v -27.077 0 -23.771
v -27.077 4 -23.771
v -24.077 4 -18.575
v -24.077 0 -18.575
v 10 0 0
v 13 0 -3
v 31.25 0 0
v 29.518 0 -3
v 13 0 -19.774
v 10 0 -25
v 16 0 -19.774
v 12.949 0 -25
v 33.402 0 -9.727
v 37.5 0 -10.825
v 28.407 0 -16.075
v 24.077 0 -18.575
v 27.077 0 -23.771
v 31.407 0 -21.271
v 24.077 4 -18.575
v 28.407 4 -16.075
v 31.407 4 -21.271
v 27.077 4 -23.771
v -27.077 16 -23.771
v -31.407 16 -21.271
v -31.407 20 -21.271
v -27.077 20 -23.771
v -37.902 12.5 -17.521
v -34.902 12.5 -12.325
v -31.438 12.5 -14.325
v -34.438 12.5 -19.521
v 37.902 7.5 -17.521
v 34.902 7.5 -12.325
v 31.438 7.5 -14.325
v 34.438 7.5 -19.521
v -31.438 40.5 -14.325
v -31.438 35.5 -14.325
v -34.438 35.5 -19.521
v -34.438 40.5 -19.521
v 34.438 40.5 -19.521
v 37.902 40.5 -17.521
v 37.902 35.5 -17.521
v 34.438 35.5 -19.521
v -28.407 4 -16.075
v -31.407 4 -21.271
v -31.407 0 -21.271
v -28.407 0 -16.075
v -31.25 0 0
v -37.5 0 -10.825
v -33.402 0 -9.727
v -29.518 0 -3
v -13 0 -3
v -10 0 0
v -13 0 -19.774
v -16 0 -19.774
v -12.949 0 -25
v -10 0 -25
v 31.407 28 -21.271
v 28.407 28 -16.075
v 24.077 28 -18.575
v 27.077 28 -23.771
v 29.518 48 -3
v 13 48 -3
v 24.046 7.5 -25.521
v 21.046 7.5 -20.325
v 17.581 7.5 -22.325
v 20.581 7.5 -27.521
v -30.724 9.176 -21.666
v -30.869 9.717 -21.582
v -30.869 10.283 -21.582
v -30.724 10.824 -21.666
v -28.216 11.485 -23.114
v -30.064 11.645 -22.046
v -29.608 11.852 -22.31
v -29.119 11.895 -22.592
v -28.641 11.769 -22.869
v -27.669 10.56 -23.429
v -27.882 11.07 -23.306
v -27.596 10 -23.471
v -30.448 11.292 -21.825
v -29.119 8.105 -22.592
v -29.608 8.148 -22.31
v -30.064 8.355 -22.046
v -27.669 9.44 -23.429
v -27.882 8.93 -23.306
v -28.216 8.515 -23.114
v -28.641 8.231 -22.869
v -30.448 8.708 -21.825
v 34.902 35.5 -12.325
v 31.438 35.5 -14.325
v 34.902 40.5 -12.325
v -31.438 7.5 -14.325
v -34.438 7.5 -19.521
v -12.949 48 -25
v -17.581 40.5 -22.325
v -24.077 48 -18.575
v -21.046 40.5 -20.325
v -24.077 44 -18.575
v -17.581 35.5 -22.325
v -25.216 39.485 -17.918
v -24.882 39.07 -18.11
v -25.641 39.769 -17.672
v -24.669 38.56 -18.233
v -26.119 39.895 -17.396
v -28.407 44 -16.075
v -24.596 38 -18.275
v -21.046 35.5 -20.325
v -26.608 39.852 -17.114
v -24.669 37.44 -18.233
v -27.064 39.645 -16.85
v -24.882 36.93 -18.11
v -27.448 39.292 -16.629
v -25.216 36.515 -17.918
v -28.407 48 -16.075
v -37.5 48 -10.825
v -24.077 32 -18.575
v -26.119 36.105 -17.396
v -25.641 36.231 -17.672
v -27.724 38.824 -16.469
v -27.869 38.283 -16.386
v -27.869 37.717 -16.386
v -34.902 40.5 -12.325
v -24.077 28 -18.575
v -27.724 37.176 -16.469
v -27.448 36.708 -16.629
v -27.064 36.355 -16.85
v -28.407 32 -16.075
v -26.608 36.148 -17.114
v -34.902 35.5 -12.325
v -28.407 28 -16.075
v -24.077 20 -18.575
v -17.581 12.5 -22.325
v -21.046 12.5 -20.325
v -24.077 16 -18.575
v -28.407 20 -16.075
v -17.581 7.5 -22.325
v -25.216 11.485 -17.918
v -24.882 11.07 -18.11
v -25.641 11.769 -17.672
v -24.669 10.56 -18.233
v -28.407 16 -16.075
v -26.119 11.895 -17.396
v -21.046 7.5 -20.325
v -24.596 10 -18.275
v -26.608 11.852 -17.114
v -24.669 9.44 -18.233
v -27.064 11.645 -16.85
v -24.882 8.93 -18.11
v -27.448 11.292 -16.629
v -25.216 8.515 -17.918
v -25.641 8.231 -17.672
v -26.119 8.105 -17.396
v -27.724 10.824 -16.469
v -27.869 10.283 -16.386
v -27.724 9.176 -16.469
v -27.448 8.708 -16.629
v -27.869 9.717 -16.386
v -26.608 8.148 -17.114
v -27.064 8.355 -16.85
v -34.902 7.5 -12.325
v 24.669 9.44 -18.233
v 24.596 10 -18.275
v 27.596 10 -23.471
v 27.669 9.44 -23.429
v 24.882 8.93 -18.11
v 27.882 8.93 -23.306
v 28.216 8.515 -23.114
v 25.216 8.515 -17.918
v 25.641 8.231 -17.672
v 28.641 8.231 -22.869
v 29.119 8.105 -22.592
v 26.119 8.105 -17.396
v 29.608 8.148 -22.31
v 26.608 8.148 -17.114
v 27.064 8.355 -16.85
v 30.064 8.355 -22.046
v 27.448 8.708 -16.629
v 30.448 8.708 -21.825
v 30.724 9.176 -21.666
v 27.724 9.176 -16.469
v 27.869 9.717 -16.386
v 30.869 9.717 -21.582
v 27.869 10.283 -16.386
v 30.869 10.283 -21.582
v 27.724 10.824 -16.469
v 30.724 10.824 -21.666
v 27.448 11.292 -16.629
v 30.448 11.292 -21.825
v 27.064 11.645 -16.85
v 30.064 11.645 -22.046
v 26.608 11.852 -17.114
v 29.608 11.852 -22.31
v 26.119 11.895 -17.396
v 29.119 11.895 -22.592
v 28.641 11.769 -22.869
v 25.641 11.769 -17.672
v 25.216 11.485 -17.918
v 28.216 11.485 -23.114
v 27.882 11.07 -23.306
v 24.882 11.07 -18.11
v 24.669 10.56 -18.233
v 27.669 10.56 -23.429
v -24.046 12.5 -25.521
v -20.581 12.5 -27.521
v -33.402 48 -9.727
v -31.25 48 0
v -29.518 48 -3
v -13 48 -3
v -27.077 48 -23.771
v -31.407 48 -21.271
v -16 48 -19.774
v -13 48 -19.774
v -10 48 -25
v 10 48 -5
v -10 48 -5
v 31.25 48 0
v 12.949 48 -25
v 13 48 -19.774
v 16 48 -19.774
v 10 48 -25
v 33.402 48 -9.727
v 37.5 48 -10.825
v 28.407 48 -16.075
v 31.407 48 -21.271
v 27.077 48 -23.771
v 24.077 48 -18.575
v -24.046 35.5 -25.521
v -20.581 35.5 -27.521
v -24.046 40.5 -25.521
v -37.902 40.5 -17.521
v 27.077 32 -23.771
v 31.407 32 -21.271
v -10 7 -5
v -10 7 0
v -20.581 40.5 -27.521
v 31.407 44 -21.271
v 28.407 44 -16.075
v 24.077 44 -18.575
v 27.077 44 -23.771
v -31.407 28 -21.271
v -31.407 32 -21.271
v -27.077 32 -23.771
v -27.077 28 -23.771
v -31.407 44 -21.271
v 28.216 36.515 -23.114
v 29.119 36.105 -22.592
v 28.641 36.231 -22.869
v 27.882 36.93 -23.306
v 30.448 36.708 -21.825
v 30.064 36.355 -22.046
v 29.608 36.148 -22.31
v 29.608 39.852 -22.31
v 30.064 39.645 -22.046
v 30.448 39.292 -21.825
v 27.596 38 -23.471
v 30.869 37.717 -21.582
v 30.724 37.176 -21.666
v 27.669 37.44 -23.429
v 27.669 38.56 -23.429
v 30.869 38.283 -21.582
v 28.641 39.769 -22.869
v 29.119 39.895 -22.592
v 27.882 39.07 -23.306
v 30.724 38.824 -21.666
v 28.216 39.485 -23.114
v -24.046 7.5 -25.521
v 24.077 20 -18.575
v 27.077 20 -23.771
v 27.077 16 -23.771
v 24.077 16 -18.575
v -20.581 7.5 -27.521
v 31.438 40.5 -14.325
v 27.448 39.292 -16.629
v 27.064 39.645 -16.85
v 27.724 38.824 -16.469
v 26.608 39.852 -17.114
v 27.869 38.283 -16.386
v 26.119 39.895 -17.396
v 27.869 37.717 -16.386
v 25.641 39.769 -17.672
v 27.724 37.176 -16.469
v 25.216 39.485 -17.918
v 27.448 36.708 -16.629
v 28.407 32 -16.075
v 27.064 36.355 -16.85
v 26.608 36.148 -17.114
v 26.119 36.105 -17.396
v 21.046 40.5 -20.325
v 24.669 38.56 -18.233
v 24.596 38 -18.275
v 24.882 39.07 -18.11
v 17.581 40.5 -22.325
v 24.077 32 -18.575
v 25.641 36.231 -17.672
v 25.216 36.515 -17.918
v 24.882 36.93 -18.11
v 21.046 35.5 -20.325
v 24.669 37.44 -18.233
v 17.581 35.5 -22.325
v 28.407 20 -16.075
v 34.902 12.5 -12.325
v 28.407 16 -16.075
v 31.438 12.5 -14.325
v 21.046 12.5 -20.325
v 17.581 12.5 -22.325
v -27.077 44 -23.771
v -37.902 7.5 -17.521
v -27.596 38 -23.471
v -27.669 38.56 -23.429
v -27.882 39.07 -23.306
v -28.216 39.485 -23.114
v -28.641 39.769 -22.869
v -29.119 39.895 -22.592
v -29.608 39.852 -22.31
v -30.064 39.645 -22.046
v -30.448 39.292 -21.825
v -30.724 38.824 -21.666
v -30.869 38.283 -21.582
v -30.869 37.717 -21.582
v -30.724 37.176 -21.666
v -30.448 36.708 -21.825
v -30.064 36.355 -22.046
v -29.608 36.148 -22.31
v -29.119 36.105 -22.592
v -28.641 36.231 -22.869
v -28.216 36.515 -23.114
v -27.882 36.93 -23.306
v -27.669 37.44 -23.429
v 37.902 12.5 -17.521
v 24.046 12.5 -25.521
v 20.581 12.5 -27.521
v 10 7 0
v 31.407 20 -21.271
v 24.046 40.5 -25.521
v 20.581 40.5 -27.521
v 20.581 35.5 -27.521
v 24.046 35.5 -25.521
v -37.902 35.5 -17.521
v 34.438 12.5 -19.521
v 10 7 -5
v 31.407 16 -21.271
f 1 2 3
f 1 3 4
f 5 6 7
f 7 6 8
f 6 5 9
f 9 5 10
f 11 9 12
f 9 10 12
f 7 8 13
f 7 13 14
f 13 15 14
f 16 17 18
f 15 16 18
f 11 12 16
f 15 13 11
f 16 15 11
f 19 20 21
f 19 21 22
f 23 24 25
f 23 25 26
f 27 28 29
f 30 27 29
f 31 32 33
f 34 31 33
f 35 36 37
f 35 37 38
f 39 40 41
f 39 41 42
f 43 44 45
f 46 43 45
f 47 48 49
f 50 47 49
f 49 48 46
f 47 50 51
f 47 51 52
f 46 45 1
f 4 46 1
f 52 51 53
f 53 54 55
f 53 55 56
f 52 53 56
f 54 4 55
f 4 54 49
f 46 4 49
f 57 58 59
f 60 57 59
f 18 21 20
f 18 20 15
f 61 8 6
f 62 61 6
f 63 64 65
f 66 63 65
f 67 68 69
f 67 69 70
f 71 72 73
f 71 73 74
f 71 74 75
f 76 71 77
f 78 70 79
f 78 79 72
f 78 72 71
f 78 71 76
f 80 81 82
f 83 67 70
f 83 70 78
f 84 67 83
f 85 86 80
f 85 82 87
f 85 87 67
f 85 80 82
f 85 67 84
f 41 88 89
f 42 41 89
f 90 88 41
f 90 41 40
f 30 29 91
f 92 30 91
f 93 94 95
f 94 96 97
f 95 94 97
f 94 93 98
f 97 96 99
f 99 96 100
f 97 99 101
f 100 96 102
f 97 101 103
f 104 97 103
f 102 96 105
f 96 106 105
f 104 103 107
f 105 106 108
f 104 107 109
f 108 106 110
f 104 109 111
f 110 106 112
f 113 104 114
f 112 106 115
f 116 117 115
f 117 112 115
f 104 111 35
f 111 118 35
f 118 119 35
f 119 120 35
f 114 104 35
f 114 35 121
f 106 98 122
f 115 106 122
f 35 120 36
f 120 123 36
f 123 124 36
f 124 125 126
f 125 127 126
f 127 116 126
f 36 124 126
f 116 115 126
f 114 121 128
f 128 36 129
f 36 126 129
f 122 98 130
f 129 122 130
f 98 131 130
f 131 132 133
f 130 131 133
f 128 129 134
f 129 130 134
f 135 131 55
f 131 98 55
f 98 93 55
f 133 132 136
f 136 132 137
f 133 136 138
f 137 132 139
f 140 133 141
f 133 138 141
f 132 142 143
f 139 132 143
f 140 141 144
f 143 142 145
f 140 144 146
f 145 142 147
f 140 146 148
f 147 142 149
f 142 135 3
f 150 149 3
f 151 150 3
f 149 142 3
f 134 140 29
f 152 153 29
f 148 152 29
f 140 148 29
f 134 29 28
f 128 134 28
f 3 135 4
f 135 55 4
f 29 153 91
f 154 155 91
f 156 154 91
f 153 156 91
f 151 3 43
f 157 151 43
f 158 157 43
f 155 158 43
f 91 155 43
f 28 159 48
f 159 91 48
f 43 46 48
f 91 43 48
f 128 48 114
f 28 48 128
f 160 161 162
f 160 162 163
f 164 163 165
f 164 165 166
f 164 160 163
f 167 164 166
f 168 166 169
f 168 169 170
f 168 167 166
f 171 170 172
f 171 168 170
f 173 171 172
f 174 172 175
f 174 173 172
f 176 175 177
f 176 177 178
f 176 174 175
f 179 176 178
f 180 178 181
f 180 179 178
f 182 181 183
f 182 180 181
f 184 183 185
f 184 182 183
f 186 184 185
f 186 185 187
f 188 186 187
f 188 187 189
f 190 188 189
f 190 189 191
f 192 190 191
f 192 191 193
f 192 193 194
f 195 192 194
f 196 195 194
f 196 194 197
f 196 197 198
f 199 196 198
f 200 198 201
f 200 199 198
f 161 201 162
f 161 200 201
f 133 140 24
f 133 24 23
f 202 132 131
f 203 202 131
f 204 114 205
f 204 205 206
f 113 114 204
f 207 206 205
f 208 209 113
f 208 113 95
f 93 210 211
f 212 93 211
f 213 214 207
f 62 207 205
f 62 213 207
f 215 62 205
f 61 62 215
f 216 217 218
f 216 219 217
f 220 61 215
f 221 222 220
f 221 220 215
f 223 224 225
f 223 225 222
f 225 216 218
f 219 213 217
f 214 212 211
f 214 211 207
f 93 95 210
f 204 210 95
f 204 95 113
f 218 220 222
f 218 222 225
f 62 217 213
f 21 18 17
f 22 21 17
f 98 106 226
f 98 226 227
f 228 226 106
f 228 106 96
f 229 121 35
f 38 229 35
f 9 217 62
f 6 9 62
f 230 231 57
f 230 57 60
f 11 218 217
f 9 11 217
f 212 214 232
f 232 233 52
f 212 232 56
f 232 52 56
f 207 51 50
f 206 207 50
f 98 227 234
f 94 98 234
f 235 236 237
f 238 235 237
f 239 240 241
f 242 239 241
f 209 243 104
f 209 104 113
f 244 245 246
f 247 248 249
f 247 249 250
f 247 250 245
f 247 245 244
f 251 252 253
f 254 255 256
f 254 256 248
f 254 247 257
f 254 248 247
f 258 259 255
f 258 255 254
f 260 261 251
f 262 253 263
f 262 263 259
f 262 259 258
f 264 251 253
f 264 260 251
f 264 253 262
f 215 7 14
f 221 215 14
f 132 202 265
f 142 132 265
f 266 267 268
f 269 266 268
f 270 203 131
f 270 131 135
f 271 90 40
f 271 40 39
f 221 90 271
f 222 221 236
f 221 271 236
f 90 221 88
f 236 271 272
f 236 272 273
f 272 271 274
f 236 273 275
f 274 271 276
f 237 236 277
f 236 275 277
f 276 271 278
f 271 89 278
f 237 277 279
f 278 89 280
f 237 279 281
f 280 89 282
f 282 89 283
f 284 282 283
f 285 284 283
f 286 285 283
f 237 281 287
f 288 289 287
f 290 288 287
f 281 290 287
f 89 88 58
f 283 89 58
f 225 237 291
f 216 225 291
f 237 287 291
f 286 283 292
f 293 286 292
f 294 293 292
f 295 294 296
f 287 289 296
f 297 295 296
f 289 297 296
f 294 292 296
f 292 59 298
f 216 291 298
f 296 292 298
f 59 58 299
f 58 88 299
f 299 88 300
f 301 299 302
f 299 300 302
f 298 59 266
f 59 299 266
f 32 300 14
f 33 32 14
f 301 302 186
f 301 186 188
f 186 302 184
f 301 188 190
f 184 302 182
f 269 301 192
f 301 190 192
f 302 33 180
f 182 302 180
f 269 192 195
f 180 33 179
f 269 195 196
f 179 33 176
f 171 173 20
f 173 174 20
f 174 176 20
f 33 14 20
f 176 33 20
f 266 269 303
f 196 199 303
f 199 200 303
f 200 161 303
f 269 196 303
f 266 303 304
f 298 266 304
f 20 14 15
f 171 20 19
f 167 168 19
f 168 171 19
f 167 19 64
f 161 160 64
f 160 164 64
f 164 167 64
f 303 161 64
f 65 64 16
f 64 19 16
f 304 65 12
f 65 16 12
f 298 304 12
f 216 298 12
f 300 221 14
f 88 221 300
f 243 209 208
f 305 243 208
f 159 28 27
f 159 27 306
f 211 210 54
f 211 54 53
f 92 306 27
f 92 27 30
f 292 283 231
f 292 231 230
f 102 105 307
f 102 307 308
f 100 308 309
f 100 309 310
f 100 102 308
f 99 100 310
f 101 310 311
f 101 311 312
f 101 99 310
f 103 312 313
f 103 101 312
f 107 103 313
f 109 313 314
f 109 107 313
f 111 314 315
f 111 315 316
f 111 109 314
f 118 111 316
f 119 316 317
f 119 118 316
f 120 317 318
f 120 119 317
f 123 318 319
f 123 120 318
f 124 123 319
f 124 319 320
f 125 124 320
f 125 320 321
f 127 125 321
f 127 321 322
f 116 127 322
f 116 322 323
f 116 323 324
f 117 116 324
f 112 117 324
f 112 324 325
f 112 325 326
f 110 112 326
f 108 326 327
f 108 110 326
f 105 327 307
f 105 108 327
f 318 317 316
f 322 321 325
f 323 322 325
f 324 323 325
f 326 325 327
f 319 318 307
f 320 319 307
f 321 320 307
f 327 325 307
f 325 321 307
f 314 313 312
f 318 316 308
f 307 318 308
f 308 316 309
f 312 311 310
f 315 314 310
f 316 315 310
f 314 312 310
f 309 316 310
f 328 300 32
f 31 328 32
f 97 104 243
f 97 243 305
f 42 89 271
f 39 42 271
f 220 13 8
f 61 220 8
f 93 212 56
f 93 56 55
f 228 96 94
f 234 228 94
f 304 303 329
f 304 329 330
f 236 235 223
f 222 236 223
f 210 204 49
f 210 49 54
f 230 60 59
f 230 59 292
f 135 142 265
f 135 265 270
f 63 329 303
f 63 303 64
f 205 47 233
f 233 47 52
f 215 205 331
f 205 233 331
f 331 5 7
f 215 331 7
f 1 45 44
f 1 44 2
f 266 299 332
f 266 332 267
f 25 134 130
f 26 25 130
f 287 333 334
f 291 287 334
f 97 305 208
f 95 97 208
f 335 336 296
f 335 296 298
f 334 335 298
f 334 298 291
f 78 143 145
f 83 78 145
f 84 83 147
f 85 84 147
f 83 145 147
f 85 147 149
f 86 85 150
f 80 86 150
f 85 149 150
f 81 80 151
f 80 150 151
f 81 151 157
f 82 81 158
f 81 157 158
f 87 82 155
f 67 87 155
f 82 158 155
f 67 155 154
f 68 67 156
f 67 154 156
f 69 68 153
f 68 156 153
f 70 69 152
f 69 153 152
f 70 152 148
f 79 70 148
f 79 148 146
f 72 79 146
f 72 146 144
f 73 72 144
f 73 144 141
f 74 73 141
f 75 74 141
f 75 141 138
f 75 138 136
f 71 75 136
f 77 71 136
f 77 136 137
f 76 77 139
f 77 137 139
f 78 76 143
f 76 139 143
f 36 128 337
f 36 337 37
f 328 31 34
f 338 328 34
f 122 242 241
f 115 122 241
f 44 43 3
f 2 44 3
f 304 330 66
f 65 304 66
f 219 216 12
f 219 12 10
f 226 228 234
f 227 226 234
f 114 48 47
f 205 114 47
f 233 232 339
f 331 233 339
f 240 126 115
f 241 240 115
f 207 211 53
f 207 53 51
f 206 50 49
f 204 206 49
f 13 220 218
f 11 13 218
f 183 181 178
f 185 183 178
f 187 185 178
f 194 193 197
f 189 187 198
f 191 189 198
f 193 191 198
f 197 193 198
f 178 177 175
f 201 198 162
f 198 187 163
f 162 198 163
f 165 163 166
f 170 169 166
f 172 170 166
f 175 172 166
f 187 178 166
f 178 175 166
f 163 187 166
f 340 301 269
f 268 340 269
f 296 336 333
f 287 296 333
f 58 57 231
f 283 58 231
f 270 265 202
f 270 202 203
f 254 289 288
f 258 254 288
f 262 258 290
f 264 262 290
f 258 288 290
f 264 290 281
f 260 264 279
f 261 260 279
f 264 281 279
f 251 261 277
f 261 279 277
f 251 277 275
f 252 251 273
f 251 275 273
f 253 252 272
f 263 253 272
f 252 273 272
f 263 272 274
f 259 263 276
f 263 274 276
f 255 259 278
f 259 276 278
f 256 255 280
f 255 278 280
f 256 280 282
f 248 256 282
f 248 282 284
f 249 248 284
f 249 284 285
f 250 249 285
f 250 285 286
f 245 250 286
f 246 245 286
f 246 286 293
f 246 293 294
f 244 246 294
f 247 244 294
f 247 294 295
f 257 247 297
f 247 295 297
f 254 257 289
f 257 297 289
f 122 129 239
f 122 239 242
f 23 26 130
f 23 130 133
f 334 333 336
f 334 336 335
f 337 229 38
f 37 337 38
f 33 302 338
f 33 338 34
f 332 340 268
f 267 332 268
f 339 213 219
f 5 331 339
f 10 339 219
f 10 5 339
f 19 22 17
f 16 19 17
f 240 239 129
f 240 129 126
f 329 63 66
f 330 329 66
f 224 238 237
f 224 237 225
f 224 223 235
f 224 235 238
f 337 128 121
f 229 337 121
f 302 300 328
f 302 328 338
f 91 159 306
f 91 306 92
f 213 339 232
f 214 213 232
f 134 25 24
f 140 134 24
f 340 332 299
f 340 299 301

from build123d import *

# Parameters (mm, degrees)
BOSS_EXTRU_1_DEPTH          = 48
ENL_V_MAT_EXTRU_1_REACH     = 67.843
BOSS_EXTRU_2_DEPTH          = 48
ESQUISSE3_R                 = 1.9
ESQUISSE3_W                 = 5
ESQUISSE3_H                 = 4
ESQUISSE3_W_2               = 4
ESQUISSE3_H_2               = 5
BOSS_EXTRU_3_DEPTH          = 6
SYM_TRIE3_COPY_1_SKETCH_R   = 1.9
SYM_TRIE3_COPY_1_SKETCH_W   = 5
SYM_TRIE3_COPY_1_SKETCH_H   = 4
SYM_TRIE3_COPY_1_SKETCH_W_2 = 4
SYM_TRIE3_COPY_1_SKETCH_H_2 = 5
SYM_TRIE3_COPY_1_DEPTH      = 6
ESQUISSE5_W                 = 20
ESQUISSE5_H                 = 5
ENL_V_MAT_EXTRU_2_DEPTH     = 7


with BuildPart() as part:
    # Esquisse1 → Boss.-Extru.1 (new body)
    with BuildSketch(Plane(origin=(0, 0, 0), x_dir=(1, 0, 0), z_dir=(0, 1, 0))):
        Polygon((-31.25, 0), (31.25, 0), (37.5, 10.825317547), (12.948729811, 25), (10, 25), (10, 5), (-10, 5), (-10, 25), (-12.948729811, 25), (-37.5, 10.825317547), align=None)
    extrude(amount=BOSS_EXTRU_1_DEPTH)

    # Esquisse2 → Enlèv. mat.-Extru.1 (cut, up to next)
    with BuildSketch(Plane(origin=(0, 48, 0), x_dir=(1, 0, 0), z_dir=(0, 1, 0)), mode=Mode.PRIVATE) as enl_v_mat_extru_1_sk1:
        Polygon((-36, 8.227241336), (-16, 19.77424672), (-13, 19.77424672), (-13, 0), (-31.25, 0), align=None)
    enl_v_mat_extru_1_tool1 = extrude(enl_v_mat_extru_1_sk1.sketch, amount=-ENL_V_MAT_EXTRU_1_REACH, mode=Mode.PRIVATE) & part.part
    enl_v_mat_extru_1 = enl_v_mat_extru_1_tool1.solids().sort_by_distance((-22.148909, 48, -8.14347))[0]
    add(enl_v_mat_extru_1, mode=Mode.SUBTRACT)

    # Symétrie1: Enlèv. mat.-Extru.1 across plane
    add(enl_v_mat_extru_1.mirror(Plane(origin=(0, 0, 0), x_dir=(0, 0, 1), z_dir=(1, 0, 0))), mode=Mode.SUBTRACT)

    # Esquisse4 → Boss.-Extru.2 (add)
    with BuildSketch(Plane(origin=(0, 0, 0), x_dir=(1, 0, 0), z_dir=(0, 1, 0))):
        Polygon((-37.5, 10.825317547), (-31.25, 0), (31.25, 0), (37.5, 10.825317547), (34.901923789, 12.325317547), (29.517949192, 3), (-29.517949192, 3), (-34.901923789, 12.325317547), align=None)
    extrude(amount=BOSS_EXTRU_2_DEPTH)

    # Esquisse3 → Boss.-Extru.3 (add)
    with BuildSketch(Plane(origin=(-14.0625, 0, -24.356964481), x_dir=(0.8660254037844396, 0, -0.4999999999999984), z_dir=(0.49999999999999833, 0, 0.8660254037844395))):
        with Locations((-14.063293868, 38)):
            Circle(ESQUISSE3_R)
        with Locations((-14.063293868, 46)):
            Rectangle(ESQUISSE3_W, ESQUISSE3_H)
        with Locations((-22.063293868, 38)):
            Rectangle(ESQUISSE3_W_2, ESQUISSE3_H_2)
        with Locations((-6.063293868, 38)):
            Rectangle(ESQUISSE3_W_2, ESQUISSE3_H_2)
        with Locations((-14.063293868, 30)):
            Rectangle(ESQUISSE3_W, ESQUISSE3_H)
    boss_extru_3 = extrude(amount=-BOSS_EXTRU_3_DEPTH)

    # Symétrie2: Boss.-Extru.3 across plane
    add(boss_extru_3.mirror(Plane.ZX.offset(24)))

    # Symétrie3: Boss.-Extru.3 across plane
    add(boss_extru_3.mirror(Plane(origin=(0, 0, 0), x_dir=(0, 0, 1), z_dir=(1, 0, 0))))

    # Symétrie3 copy 1 sketch → Symétrie3 copy 1 (add)
    with BuildSketch(Plane(origin=(14.0625, 48, -24.356964481), x_dir=(-0.8660254037844396, 0, -0.4999999999999984), z_dir=(-0.49999999999999833, 0, 0.8660254037844395))):
        with Locations((-14.063293868, 38)):
            Circle(SYM_TRIE3_COPY_1_SKETCH_R)
        with Locations((-14.063293868, 46)):
            Rectangle(SYM_TRIE3_COPY_1_SKETCH_W, SYM_TRIE3_COPY_1_SKETCH_H)
        with Locations((-22.063293868, 38)):
            Rectangle(SYM_TRIE3_COPY_1_SKETCH_W_2, SYM_TRIE3_COPY_1_SKETCH_H_2)
        with Locations((-6.063293868, 38)):
            Rectangle(SYM_TRIE3_COPY_1_SKETCH_W_2, SYM_TRIE3_COPY_1_SKETCH_H_2)
        with Locations((-14.063293868, 30)):
            Rectangle(SYM_TRIE3_COPY_1_SKETCH_W, SYM_TRIE3_COPY_1_SKETCH_H)
    extrude(amount=-SYM_TRIE3_COPY_1_DEPTH)

    # Esquisse5 → Enlèv. mat.-Extru.2 (cut)
    with BuildSketch(Plane(origin=(0, 0, 0), x_dir=(1, 0, 0), z_dir=(0, 1, 0))):
        with Locations((0, 2.5)):
            Rectangle(ESQUISSE5_W, ESQUISSE5_H)
    extrude(amount=ENL_V_MAT_EXTRU_2_DEPTH, mode=Mode.SUBTRACT)


solid = part.part
